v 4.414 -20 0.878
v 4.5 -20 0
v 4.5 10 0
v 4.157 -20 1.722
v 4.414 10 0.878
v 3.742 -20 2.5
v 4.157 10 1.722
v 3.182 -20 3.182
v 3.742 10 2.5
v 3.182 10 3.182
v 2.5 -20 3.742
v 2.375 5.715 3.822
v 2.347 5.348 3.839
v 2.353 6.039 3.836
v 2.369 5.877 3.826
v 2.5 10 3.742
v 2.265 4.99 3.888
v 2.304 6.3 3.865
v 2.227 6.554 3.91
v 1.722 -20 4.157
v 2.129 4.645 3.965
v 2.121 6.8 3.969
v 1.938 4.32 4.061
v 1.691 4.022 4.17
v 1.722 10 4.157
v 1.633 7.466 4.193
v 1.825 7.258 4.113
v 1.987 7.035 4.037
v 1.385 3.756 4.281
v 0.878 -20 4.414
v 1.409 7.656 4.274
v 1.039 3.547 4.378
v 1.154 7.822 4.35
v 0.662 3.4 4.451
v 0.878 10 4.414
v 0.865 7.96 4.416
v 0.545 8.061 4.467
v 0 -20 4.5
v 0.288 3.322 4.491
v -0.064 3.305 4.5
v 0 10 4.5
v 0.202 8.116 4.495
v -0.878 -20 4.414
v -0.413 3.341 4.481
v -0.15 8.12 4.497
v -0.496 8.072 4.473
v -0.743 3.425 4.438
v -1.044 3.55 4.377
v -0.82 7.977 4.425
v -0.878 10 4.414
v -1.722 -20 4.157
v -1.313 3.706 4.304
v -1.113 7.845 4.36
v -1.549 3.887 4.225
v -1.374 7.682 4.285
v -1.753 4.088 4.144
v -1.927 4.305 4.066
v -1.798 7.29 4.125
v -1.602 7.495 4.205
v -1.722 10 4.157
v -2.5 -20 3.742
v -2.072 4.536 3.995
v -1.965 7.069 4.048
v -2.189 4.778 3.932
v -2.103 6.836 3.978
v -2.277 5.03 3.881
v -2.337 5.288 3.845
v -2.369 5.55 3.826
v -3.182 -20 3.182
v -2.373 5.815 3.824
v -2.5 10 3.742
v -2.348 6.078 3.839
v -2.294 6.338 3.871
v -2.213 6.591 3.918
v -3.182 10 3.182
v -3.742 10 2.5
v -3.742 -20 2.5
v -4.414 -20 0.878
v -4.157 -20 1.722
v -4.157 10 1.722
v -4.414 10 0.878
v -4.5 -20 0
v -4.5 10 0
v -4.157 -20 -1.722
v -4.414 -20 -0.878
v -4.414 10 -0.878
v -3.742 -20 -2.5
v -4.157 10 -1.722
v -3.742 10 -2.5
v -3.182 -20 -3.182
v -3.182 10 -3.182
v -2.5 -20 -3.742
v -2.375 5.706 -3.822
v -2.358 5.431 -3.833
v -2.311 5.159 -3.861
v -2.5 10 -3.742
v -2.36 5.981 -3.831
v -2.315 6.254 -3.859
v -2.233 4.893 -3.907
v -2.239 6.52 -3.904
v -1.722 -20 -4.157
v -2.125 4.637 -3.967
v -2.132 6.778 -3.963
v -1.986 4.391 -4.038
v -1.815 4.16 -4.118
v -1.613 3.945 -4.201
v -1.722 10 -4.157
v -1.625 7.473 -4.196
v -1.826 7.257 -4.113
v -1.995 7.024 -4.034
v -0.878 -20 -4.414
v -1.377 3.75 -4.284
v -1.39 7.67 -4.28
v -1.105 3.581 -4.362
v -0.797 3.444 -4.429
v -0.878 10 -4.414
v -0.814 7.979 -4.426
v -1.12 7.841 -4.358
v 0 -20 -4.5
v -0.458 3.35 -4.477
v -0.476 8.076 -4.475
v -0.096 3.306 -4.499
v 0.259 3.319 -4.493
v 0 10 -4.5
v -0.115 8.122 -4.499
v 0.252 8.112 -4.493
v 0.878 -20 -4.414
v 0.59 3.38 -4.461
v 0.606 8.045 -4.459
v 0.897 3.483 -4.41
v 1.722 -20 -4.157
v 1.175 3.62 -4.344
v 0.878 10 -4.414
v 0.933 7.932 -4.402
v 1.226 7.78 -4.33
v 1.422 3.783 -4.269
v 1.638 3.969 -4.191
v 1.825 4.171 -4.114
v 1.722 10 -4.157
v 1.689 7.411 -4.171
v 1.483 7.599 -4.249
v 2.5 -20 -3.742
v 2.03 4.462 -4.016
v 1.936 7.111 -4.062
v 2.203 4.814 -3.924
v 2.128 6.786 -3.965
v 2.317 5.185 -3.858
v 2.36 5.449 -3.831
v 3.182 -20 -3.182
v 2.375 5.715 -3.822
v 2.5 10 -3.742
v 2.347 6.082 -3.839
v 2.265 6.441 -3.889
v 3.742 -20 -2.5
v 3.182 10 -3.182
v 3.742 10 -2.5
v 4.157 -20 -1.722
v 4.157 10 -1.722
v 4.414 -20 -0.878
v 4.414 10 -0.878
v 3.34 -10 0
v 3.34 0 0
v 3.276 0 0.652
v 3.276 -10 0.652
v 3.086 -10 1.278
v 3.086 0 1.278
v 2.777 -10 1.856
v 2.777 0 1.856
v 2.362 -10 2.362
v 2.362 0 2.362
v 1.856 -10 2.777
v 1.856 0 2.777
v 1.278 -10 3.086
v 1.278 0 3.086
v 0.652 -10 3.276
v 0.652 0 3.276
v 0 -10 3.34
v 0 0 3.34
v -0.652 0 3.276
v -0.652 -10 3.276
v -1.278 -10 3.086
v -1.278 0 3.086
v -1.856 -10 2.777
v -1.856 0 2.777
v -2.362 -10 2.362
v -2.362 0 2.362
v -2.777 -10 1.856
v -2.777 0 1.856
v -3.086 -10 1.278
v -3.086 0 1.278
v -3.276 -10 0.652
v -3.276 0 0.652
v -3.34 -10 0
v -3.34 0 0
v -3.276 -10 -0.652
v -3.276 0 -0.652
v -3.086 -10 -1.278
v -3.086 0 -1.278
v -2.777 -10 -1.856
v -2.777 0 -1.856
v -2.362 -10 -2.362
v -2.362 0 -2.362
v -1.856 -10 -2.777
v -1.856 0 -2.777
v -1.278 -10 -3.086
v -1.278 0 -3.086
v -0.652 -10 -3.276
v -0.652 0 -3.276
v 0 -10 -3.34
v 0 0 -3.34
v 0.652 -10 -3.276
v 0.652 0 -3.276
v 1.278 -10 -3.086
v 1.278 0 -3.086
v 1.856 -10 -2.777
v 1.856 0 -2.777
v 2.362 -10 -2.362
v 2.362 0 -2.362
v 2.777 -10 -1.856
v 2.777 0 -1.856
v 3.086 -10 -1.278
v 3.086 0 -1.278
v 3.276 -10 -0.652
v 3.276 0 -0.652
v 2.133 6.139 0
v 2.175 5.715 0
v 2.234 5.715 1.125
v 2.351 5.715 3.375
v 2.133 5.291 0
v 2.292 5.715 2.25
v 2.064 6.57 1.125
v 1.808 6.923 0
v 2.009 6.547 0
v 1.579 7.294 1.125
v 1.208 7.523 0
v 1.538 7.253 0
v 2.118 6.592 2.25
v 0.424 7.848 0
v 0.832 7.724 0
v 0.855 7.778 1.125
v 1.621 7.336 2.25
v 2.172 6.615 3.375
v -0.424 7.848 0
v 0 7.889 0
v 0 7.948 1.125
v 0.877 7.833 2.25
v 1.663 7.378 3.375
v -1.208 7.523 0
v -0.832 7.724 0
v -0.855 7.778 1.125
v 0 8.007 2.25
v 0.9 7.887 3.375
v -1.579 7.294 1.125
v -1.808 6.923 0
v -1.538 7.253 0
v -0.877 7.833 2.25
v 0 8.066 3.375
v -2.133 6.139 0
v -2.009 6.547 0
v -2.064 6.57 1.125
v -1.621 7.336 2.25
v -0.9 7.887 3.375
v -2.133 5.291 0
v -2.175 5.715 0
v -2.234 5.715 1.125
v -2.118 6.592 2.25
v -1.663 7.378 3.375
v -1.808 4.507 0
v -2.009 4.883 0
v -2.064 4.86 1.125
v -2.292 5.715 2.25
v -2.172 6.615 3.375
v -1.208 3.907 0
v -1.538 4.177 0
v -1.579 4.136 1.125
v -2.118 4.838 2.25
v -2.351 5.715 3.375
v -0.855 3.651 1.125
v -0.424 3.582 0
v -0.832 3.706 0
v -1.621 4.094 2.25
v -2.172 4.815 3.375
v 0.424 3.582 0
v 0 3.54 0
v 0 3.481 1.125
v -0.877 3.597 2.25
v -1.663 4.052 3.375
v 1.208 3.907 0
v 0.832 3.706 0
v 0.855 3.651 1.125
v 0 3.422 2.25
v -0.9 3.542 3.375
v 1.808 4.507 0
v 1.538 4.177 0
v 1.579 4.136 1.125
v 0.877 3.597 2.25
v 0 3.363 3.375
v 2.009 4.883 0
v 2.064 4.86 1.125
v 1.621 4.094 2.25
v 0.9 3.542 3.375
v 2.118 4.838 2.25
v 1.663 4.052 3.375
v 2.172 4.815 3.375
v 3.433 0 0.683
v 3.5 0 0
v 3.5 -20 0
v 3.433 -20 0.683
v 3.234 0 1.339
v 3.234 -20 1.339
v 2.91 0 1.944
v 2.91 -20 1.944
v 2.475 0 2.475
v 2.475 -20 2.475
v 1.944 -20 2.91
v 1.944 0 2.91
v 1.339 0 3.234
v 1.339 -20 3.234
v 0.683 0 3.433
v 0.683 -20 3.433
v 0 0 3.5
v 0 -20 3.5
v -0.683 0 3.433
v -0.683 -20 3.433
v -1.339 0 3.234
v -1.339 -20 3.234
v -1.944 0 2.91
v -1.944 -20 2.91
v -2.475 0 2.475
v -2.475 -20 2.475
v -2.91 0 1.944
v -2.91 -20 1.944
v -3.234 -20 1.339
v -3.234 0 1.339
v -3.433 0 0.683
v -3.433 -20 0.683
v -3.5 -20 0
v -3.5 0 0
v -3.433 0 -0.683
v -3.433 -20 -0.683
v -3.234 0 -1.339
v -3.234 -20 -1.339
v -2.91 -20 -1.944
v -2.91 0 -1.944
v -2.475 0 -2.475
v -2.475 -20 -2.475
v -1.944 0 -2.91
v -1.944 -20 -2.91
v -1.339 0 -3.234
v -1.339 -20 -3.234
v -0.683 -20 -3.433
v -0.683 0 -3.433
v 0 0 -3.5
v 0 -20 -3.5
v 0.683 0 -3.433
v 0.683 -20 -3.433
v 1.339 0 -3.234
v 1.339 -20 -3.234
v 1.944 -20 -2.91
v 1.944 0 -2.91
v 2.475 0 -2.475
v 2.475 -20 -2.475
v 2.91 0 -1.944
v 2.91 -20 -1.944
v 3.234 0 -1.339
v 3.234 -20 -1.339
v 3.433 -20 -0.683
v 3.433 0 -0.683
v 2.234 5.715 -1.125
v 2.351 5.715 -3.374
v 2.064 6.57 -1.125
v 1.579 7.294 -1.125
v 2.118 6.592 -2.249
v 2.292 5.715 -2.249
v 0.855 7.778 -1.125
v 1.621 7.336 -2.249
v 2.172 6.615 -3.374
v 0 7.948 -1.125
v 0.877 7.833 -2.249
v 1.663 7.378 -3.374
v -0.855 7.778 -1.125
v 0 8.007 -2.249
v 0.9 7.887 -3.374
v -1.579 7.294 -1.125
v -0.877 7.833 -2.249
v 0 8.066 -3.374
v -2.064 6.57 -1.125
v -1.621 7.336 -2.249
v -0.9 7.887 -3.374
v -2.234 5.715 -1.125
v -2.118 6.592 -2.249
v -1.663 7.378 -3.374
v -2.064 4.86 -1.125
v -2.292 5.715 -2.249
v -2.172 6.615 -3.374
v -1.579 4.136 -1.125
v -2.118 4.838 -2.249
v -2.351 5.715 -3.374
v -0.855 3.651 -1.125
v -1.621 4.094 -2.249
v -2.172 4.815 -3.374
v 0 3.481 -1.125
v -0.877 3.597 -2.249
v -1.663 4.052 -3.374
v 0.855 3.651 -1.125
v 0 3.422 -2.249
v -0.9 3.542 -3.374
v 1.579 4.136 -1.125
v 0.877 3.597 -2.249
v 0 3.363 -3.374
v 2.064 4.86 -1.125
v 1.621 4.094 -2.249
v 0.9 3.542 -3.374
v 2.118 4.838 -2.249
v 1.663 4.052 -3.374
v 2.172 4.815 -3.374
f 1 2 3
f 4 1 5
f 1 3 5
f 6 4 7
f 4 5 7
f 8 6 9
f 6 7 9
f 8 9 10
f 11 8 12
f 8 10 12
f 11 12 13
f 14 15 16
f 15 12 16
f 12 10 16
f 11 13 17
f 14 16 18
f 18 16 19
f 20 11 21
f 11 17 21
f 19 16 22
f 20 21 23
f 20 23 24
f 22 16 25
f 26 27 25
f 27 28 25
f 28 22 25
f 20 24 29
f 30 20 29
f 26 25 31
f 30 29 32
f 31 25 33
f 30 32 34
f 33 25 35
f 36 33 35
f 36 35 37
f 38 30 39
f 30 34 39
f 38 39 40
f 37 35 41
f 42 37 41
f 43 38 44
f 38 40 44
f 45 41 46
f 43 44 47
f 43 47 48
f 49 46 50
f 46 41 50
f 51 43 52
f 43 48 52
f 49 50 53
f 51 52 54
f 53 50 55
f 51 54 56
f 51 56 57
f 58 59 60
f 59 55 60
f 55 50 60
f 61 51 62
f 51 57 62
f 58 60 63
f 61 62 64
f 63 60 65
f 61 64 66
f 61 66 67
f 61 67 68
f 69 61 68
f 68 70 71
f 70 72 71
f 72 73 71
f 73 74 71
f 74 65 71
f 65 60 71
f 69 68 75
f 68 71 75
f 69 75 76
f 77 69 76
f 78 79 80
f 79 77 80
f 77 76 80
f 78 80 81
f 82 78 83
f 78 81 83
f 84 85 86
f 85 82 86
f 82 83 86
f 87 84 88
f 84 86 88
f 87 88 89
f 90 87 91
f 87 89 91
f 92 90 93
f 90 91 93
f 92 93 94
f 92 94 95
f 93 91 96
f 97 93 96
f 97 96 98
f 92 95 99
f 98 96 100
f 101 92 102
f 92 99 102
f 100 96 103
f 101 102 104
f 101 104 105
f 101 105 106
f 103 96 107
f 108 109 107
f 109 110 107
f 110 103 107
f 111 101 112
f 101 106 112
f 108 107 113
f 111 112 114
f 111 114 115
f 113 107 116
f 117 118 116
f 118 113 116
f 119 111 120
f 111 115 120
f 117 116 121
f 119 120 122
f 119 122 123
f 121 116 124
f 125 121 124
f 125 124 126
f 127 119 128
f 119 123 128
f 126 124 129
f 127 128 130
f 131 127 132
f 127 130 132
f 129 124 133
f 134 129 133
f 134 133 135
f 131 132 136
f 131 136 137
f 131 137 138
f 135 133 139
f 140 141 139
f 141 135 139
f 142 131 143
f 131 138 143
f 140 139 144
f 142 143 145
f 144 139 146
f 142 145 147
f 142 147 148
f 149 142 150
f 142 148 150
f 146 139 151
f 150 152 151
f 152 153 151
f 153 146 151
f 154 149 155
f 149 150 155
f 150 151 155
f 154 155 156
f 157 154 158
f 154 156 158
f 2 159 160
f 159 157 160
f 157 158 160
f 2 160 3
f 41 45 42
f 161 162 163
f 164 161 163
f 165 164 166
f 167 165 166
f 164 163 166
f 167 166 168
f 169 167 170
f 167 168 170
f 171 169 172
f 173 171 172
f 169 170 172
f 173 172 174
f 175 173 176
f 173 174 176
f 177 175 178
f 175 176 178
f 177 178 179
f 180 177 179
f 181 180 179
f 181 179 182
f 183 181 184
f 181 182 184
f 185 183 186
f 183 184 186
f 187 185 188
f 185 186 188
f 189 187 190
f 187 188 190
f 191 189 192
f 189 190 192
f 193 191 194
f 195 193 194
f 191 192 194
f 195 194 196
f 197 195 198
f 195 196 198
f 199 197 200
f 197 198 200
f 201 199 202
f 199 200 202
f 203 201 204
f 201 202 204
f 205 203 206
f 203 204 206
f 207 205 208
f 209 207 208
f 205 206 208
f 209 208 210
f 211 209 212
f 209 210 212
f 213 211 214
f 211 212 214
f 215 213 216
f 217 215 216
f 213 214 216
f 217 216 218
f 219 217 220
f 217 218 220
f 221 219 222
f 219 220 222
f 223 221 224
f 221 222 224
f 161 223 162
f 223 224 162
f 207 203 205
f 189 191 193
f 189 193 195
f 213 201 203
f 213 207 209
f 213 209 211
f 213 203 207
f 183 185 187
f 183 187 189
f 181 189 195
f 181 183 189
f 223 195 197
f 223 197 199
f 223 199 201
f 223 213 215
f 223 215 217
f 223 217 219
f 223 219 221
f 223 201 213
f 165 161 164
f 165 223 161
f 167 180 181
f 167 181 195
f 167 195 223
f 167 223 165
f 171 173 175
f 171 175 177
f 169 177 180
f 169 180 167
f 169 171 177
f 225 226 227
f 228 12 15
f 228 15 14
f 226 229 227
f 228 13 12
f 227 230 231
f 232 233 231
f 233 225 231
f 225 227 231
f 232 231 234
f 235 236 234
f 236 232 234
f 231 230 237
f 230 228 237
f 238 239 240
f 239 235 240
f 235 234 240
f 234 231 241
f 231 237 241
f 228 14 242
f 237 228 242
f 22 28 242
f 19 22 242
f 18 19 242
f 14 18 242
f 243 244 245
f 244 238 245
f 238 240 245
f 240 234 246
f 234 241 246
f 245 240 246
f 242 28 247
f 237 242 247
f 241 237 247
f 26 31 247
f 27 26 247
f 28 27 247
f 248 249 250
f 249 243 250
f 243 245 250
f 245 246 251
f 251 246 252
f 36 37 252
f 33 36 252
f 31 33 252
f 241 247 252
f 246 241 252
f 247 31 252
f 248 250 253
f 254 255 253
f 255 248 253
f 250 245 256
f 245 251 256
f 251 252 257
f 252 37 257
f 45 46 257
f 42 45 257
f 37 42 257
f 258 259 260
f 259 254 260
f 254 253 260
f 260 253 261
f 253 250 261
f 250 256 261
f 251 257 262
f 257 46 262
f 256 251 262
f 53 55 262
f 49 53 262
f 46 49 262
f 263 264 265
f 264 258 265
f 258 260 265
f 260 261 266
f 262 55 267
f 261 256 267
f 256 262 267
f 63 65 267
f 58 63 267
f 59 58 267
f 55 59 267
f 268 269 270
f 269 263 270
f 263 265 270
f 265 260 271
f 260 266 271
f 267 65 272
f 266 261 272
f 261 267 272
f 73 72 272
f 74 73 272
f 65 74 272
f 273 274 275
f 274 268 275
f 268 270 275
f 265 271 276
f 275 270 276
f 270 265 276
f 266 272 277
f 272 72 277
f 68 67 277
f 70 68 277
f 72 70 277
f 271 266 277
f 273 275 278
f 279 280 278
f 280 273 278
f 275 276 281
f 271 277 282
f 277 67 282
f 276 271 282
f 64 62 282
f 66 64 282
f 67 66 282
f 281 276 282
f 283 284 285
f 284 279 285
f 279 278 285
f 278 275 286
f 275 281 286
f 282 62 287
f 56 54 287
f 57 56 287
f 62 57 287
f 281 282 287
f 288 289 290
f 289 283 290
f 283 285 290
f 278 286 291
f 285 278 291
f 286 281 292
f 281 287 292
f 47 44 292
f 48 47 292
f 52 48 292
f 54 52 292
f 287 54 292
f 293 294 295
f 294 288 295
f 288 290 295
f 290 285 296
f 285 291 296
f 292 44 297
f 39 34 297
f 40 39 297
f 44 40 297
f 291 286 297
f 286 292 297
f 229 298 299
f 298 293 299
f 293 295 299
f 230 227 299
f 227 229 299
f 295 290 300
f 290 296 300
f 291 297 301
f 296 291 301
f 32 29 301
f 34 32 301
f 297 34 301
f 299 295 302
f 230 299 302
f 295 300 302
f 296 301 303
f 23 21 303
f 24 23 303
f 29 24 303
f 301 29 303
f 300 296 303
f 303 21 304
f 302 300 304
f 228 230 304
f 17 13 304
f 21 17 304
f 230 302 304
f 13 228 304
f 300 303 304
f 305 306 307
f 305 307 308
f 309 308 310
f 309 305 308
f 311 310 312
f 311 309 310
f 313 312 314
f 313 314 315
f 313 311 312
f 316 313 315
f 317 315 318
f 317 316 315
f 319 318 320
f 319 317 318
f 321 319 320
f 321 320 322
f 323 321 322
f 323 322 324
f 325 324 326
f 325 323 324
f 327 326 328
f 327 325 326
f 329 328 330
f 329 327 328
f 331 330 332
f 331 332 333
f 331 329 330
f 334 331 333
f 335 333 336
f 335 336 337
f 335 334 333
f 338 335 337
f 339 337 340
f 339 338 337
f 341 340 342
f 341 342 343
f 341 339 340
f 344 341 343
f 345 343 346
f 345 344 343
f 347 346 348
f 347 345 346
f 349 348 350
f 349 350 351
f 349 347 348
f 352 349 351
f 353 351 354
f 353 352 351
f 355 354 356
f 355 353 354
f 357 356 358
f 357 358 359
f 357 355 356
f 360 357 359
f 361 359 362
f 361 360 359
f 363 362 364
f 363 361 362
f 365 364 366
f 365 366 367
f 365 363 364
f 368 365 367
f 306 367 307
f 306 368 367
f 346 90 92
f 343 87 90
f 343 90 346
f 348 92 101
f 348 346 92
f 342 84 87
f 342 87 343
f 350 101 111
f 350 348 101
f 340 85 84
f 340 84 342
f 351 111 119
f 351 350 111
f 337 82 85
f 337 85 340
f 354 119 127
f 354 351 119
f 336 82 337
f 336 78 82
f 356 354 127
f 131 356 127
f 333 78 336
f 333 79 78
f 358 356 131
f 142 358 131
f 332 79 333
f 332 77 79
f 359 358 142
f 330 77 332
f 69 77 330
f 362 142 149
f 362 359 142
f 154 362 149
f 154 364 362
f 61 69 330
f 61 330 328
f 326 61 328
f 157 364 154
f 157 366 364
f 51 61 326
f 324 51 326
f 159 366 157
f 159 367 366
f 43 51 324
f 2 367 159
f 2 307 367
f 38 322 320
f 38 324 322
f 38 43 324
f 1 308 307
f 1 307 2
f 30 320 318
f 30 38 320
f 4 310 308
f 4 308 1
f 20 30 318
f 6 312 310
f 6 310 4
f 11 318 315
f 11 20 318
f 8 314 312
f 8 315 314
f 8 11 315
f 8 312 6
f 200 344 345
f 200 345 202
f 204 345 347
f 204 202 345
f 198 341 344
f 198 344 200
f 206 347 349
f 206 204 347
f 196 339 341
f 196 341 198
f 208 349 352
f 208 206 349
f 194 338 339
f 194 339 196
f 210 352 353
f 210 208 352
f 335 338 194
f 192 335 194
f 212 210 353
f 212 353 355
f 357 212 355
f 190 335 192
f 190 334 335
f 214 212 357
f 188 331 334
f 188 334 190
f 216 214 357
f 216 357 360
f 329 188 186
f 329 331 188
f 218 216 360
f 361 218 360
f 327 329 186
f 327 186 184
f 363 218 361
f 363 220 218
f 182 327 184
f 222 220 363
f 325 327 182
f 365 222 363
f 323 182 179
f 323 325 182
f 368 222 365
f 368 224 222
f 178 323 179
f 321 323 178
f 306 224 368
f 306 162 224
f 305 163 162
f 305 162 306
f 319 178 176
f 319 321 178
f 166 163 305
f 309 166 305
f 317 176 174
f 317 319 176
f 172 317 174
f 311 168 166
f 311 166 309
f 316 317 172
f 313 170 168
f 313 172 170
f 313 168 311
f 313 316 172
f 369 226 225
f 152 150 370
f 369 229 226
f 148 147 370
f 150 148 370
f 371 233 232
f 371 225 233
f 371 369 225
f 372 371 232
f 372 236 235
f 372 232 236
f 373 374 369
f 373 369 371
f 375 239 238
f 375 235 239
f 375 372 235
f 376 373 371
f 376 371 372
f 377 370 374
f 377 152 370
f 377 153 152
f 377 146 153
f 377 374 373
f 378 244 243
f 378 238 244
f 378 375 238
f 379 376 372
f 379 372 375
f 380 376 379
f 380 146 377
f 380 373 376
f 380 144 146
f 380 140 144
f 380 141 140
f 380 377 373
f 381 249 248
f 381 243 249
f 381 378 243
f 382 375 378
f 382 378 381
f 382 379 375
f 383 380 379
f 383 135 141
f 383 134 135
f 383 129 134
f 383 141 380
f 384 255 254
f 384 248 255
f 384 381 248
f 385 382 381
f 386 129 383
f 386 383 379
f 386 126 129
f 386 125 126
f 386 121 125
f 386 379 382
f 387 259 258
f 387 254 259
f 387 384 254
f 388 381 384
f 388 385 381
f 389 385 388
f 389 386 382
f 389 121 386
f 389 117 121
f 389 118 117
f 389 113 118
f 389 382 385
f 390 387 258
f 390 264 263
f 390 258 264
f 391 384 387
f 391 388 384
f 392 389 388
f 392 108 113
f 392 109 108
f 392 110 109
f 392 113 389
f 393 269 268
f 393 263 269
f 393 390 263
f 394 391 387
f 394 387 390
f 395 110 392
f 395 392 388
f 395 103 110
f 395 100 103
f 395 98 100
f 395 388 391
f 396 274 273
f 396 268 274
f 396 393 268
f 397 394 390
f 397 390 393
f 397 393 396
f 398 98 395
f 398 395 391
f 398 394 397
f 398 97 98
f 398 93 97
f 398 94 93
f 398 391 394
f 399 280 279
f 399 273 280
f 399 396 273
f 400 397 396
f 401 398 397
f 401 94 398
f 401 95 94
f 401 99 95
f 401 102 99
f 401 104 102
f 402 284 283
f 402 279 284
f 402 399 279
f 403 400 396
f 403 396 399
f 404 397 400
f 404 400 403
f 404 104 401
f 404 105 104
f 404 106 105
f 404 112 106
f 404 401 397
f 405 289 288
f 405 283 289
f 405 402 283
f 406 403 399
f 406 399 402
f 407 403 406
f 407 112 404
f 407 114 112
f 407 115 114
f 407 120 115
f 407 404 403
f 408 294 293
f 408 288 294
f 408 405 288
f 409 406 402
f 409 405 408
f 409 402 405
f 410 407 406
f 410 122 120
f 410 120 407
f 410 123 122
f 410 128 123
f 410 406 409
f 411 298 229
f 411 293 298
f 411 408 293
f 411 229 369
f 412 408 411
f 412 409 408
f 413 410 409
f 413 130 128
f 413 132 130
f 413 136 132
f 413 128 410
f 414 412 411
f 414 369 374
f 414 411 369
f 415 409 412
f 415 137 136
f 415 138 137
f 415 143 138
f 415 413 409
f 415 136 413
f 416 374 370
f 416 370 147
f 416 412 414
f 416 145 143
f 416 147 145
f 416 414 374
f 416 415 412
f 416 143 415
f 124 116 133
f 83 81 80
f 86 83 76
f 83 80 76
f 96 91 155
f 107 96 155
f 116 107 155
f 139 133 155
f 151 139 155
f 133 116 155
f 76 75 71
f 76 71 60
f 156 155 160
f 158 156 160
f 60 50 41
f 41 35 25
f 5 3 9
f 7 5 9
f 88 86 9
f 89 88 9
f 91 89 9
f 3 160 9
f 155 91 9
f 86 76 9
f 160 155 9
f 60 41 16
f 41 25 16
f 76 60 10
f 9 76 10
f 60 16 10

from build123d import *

# Parameters (mm, degrees)
F0_R     = 3.5
F1_DEPTH = 20
F2_T     = 1
F3_R     = 3.3401010272
F4_DEPTH = 10
F5_R     = 4.5
F6_DEPTH = 10
F7_R     = 2.1745755041
F8_DEPTH = 15
F8_TAPER = -3


with BuildPart() as f1:
    # F0 (on Front) → F1 (new body)
    with BuildSketch(Plane.XZ):
        Circle(F0_R)
    extrude(amount=F1_DEPTH)

    # F2
    f2_openings = [f1.faces().sort_by_distance(p)[0] for p in [
        (0, -20, 0),
    ]]
    offset(amount=F2_T, openings=f2_openings, kind=Kind.INTERSECTION)

    # F3 (on Front) → F4 (join)
    with BuildSketch(Plane.XZ):
        Circle(F3_R)
    extrude(amount=F4_DEPTH)

    # F5 (on Front) → F6 (join)
    with BuildSketch(Plane.XZ):
        Circle(F5_R)
    extrude(amount=-F6_DEPTH)

    # F7 (on Top) → F8 (cut, symmetric)
    with BuildSketch(Plane.XY):
        with Locations((0, 5.7148435153)):
            Circle(F7_R)
    extrude(amount=F8_DEPTH, both=True, taper=F8_TAPER, mode=Mode.SUBTRACT)


solid = f1.part
